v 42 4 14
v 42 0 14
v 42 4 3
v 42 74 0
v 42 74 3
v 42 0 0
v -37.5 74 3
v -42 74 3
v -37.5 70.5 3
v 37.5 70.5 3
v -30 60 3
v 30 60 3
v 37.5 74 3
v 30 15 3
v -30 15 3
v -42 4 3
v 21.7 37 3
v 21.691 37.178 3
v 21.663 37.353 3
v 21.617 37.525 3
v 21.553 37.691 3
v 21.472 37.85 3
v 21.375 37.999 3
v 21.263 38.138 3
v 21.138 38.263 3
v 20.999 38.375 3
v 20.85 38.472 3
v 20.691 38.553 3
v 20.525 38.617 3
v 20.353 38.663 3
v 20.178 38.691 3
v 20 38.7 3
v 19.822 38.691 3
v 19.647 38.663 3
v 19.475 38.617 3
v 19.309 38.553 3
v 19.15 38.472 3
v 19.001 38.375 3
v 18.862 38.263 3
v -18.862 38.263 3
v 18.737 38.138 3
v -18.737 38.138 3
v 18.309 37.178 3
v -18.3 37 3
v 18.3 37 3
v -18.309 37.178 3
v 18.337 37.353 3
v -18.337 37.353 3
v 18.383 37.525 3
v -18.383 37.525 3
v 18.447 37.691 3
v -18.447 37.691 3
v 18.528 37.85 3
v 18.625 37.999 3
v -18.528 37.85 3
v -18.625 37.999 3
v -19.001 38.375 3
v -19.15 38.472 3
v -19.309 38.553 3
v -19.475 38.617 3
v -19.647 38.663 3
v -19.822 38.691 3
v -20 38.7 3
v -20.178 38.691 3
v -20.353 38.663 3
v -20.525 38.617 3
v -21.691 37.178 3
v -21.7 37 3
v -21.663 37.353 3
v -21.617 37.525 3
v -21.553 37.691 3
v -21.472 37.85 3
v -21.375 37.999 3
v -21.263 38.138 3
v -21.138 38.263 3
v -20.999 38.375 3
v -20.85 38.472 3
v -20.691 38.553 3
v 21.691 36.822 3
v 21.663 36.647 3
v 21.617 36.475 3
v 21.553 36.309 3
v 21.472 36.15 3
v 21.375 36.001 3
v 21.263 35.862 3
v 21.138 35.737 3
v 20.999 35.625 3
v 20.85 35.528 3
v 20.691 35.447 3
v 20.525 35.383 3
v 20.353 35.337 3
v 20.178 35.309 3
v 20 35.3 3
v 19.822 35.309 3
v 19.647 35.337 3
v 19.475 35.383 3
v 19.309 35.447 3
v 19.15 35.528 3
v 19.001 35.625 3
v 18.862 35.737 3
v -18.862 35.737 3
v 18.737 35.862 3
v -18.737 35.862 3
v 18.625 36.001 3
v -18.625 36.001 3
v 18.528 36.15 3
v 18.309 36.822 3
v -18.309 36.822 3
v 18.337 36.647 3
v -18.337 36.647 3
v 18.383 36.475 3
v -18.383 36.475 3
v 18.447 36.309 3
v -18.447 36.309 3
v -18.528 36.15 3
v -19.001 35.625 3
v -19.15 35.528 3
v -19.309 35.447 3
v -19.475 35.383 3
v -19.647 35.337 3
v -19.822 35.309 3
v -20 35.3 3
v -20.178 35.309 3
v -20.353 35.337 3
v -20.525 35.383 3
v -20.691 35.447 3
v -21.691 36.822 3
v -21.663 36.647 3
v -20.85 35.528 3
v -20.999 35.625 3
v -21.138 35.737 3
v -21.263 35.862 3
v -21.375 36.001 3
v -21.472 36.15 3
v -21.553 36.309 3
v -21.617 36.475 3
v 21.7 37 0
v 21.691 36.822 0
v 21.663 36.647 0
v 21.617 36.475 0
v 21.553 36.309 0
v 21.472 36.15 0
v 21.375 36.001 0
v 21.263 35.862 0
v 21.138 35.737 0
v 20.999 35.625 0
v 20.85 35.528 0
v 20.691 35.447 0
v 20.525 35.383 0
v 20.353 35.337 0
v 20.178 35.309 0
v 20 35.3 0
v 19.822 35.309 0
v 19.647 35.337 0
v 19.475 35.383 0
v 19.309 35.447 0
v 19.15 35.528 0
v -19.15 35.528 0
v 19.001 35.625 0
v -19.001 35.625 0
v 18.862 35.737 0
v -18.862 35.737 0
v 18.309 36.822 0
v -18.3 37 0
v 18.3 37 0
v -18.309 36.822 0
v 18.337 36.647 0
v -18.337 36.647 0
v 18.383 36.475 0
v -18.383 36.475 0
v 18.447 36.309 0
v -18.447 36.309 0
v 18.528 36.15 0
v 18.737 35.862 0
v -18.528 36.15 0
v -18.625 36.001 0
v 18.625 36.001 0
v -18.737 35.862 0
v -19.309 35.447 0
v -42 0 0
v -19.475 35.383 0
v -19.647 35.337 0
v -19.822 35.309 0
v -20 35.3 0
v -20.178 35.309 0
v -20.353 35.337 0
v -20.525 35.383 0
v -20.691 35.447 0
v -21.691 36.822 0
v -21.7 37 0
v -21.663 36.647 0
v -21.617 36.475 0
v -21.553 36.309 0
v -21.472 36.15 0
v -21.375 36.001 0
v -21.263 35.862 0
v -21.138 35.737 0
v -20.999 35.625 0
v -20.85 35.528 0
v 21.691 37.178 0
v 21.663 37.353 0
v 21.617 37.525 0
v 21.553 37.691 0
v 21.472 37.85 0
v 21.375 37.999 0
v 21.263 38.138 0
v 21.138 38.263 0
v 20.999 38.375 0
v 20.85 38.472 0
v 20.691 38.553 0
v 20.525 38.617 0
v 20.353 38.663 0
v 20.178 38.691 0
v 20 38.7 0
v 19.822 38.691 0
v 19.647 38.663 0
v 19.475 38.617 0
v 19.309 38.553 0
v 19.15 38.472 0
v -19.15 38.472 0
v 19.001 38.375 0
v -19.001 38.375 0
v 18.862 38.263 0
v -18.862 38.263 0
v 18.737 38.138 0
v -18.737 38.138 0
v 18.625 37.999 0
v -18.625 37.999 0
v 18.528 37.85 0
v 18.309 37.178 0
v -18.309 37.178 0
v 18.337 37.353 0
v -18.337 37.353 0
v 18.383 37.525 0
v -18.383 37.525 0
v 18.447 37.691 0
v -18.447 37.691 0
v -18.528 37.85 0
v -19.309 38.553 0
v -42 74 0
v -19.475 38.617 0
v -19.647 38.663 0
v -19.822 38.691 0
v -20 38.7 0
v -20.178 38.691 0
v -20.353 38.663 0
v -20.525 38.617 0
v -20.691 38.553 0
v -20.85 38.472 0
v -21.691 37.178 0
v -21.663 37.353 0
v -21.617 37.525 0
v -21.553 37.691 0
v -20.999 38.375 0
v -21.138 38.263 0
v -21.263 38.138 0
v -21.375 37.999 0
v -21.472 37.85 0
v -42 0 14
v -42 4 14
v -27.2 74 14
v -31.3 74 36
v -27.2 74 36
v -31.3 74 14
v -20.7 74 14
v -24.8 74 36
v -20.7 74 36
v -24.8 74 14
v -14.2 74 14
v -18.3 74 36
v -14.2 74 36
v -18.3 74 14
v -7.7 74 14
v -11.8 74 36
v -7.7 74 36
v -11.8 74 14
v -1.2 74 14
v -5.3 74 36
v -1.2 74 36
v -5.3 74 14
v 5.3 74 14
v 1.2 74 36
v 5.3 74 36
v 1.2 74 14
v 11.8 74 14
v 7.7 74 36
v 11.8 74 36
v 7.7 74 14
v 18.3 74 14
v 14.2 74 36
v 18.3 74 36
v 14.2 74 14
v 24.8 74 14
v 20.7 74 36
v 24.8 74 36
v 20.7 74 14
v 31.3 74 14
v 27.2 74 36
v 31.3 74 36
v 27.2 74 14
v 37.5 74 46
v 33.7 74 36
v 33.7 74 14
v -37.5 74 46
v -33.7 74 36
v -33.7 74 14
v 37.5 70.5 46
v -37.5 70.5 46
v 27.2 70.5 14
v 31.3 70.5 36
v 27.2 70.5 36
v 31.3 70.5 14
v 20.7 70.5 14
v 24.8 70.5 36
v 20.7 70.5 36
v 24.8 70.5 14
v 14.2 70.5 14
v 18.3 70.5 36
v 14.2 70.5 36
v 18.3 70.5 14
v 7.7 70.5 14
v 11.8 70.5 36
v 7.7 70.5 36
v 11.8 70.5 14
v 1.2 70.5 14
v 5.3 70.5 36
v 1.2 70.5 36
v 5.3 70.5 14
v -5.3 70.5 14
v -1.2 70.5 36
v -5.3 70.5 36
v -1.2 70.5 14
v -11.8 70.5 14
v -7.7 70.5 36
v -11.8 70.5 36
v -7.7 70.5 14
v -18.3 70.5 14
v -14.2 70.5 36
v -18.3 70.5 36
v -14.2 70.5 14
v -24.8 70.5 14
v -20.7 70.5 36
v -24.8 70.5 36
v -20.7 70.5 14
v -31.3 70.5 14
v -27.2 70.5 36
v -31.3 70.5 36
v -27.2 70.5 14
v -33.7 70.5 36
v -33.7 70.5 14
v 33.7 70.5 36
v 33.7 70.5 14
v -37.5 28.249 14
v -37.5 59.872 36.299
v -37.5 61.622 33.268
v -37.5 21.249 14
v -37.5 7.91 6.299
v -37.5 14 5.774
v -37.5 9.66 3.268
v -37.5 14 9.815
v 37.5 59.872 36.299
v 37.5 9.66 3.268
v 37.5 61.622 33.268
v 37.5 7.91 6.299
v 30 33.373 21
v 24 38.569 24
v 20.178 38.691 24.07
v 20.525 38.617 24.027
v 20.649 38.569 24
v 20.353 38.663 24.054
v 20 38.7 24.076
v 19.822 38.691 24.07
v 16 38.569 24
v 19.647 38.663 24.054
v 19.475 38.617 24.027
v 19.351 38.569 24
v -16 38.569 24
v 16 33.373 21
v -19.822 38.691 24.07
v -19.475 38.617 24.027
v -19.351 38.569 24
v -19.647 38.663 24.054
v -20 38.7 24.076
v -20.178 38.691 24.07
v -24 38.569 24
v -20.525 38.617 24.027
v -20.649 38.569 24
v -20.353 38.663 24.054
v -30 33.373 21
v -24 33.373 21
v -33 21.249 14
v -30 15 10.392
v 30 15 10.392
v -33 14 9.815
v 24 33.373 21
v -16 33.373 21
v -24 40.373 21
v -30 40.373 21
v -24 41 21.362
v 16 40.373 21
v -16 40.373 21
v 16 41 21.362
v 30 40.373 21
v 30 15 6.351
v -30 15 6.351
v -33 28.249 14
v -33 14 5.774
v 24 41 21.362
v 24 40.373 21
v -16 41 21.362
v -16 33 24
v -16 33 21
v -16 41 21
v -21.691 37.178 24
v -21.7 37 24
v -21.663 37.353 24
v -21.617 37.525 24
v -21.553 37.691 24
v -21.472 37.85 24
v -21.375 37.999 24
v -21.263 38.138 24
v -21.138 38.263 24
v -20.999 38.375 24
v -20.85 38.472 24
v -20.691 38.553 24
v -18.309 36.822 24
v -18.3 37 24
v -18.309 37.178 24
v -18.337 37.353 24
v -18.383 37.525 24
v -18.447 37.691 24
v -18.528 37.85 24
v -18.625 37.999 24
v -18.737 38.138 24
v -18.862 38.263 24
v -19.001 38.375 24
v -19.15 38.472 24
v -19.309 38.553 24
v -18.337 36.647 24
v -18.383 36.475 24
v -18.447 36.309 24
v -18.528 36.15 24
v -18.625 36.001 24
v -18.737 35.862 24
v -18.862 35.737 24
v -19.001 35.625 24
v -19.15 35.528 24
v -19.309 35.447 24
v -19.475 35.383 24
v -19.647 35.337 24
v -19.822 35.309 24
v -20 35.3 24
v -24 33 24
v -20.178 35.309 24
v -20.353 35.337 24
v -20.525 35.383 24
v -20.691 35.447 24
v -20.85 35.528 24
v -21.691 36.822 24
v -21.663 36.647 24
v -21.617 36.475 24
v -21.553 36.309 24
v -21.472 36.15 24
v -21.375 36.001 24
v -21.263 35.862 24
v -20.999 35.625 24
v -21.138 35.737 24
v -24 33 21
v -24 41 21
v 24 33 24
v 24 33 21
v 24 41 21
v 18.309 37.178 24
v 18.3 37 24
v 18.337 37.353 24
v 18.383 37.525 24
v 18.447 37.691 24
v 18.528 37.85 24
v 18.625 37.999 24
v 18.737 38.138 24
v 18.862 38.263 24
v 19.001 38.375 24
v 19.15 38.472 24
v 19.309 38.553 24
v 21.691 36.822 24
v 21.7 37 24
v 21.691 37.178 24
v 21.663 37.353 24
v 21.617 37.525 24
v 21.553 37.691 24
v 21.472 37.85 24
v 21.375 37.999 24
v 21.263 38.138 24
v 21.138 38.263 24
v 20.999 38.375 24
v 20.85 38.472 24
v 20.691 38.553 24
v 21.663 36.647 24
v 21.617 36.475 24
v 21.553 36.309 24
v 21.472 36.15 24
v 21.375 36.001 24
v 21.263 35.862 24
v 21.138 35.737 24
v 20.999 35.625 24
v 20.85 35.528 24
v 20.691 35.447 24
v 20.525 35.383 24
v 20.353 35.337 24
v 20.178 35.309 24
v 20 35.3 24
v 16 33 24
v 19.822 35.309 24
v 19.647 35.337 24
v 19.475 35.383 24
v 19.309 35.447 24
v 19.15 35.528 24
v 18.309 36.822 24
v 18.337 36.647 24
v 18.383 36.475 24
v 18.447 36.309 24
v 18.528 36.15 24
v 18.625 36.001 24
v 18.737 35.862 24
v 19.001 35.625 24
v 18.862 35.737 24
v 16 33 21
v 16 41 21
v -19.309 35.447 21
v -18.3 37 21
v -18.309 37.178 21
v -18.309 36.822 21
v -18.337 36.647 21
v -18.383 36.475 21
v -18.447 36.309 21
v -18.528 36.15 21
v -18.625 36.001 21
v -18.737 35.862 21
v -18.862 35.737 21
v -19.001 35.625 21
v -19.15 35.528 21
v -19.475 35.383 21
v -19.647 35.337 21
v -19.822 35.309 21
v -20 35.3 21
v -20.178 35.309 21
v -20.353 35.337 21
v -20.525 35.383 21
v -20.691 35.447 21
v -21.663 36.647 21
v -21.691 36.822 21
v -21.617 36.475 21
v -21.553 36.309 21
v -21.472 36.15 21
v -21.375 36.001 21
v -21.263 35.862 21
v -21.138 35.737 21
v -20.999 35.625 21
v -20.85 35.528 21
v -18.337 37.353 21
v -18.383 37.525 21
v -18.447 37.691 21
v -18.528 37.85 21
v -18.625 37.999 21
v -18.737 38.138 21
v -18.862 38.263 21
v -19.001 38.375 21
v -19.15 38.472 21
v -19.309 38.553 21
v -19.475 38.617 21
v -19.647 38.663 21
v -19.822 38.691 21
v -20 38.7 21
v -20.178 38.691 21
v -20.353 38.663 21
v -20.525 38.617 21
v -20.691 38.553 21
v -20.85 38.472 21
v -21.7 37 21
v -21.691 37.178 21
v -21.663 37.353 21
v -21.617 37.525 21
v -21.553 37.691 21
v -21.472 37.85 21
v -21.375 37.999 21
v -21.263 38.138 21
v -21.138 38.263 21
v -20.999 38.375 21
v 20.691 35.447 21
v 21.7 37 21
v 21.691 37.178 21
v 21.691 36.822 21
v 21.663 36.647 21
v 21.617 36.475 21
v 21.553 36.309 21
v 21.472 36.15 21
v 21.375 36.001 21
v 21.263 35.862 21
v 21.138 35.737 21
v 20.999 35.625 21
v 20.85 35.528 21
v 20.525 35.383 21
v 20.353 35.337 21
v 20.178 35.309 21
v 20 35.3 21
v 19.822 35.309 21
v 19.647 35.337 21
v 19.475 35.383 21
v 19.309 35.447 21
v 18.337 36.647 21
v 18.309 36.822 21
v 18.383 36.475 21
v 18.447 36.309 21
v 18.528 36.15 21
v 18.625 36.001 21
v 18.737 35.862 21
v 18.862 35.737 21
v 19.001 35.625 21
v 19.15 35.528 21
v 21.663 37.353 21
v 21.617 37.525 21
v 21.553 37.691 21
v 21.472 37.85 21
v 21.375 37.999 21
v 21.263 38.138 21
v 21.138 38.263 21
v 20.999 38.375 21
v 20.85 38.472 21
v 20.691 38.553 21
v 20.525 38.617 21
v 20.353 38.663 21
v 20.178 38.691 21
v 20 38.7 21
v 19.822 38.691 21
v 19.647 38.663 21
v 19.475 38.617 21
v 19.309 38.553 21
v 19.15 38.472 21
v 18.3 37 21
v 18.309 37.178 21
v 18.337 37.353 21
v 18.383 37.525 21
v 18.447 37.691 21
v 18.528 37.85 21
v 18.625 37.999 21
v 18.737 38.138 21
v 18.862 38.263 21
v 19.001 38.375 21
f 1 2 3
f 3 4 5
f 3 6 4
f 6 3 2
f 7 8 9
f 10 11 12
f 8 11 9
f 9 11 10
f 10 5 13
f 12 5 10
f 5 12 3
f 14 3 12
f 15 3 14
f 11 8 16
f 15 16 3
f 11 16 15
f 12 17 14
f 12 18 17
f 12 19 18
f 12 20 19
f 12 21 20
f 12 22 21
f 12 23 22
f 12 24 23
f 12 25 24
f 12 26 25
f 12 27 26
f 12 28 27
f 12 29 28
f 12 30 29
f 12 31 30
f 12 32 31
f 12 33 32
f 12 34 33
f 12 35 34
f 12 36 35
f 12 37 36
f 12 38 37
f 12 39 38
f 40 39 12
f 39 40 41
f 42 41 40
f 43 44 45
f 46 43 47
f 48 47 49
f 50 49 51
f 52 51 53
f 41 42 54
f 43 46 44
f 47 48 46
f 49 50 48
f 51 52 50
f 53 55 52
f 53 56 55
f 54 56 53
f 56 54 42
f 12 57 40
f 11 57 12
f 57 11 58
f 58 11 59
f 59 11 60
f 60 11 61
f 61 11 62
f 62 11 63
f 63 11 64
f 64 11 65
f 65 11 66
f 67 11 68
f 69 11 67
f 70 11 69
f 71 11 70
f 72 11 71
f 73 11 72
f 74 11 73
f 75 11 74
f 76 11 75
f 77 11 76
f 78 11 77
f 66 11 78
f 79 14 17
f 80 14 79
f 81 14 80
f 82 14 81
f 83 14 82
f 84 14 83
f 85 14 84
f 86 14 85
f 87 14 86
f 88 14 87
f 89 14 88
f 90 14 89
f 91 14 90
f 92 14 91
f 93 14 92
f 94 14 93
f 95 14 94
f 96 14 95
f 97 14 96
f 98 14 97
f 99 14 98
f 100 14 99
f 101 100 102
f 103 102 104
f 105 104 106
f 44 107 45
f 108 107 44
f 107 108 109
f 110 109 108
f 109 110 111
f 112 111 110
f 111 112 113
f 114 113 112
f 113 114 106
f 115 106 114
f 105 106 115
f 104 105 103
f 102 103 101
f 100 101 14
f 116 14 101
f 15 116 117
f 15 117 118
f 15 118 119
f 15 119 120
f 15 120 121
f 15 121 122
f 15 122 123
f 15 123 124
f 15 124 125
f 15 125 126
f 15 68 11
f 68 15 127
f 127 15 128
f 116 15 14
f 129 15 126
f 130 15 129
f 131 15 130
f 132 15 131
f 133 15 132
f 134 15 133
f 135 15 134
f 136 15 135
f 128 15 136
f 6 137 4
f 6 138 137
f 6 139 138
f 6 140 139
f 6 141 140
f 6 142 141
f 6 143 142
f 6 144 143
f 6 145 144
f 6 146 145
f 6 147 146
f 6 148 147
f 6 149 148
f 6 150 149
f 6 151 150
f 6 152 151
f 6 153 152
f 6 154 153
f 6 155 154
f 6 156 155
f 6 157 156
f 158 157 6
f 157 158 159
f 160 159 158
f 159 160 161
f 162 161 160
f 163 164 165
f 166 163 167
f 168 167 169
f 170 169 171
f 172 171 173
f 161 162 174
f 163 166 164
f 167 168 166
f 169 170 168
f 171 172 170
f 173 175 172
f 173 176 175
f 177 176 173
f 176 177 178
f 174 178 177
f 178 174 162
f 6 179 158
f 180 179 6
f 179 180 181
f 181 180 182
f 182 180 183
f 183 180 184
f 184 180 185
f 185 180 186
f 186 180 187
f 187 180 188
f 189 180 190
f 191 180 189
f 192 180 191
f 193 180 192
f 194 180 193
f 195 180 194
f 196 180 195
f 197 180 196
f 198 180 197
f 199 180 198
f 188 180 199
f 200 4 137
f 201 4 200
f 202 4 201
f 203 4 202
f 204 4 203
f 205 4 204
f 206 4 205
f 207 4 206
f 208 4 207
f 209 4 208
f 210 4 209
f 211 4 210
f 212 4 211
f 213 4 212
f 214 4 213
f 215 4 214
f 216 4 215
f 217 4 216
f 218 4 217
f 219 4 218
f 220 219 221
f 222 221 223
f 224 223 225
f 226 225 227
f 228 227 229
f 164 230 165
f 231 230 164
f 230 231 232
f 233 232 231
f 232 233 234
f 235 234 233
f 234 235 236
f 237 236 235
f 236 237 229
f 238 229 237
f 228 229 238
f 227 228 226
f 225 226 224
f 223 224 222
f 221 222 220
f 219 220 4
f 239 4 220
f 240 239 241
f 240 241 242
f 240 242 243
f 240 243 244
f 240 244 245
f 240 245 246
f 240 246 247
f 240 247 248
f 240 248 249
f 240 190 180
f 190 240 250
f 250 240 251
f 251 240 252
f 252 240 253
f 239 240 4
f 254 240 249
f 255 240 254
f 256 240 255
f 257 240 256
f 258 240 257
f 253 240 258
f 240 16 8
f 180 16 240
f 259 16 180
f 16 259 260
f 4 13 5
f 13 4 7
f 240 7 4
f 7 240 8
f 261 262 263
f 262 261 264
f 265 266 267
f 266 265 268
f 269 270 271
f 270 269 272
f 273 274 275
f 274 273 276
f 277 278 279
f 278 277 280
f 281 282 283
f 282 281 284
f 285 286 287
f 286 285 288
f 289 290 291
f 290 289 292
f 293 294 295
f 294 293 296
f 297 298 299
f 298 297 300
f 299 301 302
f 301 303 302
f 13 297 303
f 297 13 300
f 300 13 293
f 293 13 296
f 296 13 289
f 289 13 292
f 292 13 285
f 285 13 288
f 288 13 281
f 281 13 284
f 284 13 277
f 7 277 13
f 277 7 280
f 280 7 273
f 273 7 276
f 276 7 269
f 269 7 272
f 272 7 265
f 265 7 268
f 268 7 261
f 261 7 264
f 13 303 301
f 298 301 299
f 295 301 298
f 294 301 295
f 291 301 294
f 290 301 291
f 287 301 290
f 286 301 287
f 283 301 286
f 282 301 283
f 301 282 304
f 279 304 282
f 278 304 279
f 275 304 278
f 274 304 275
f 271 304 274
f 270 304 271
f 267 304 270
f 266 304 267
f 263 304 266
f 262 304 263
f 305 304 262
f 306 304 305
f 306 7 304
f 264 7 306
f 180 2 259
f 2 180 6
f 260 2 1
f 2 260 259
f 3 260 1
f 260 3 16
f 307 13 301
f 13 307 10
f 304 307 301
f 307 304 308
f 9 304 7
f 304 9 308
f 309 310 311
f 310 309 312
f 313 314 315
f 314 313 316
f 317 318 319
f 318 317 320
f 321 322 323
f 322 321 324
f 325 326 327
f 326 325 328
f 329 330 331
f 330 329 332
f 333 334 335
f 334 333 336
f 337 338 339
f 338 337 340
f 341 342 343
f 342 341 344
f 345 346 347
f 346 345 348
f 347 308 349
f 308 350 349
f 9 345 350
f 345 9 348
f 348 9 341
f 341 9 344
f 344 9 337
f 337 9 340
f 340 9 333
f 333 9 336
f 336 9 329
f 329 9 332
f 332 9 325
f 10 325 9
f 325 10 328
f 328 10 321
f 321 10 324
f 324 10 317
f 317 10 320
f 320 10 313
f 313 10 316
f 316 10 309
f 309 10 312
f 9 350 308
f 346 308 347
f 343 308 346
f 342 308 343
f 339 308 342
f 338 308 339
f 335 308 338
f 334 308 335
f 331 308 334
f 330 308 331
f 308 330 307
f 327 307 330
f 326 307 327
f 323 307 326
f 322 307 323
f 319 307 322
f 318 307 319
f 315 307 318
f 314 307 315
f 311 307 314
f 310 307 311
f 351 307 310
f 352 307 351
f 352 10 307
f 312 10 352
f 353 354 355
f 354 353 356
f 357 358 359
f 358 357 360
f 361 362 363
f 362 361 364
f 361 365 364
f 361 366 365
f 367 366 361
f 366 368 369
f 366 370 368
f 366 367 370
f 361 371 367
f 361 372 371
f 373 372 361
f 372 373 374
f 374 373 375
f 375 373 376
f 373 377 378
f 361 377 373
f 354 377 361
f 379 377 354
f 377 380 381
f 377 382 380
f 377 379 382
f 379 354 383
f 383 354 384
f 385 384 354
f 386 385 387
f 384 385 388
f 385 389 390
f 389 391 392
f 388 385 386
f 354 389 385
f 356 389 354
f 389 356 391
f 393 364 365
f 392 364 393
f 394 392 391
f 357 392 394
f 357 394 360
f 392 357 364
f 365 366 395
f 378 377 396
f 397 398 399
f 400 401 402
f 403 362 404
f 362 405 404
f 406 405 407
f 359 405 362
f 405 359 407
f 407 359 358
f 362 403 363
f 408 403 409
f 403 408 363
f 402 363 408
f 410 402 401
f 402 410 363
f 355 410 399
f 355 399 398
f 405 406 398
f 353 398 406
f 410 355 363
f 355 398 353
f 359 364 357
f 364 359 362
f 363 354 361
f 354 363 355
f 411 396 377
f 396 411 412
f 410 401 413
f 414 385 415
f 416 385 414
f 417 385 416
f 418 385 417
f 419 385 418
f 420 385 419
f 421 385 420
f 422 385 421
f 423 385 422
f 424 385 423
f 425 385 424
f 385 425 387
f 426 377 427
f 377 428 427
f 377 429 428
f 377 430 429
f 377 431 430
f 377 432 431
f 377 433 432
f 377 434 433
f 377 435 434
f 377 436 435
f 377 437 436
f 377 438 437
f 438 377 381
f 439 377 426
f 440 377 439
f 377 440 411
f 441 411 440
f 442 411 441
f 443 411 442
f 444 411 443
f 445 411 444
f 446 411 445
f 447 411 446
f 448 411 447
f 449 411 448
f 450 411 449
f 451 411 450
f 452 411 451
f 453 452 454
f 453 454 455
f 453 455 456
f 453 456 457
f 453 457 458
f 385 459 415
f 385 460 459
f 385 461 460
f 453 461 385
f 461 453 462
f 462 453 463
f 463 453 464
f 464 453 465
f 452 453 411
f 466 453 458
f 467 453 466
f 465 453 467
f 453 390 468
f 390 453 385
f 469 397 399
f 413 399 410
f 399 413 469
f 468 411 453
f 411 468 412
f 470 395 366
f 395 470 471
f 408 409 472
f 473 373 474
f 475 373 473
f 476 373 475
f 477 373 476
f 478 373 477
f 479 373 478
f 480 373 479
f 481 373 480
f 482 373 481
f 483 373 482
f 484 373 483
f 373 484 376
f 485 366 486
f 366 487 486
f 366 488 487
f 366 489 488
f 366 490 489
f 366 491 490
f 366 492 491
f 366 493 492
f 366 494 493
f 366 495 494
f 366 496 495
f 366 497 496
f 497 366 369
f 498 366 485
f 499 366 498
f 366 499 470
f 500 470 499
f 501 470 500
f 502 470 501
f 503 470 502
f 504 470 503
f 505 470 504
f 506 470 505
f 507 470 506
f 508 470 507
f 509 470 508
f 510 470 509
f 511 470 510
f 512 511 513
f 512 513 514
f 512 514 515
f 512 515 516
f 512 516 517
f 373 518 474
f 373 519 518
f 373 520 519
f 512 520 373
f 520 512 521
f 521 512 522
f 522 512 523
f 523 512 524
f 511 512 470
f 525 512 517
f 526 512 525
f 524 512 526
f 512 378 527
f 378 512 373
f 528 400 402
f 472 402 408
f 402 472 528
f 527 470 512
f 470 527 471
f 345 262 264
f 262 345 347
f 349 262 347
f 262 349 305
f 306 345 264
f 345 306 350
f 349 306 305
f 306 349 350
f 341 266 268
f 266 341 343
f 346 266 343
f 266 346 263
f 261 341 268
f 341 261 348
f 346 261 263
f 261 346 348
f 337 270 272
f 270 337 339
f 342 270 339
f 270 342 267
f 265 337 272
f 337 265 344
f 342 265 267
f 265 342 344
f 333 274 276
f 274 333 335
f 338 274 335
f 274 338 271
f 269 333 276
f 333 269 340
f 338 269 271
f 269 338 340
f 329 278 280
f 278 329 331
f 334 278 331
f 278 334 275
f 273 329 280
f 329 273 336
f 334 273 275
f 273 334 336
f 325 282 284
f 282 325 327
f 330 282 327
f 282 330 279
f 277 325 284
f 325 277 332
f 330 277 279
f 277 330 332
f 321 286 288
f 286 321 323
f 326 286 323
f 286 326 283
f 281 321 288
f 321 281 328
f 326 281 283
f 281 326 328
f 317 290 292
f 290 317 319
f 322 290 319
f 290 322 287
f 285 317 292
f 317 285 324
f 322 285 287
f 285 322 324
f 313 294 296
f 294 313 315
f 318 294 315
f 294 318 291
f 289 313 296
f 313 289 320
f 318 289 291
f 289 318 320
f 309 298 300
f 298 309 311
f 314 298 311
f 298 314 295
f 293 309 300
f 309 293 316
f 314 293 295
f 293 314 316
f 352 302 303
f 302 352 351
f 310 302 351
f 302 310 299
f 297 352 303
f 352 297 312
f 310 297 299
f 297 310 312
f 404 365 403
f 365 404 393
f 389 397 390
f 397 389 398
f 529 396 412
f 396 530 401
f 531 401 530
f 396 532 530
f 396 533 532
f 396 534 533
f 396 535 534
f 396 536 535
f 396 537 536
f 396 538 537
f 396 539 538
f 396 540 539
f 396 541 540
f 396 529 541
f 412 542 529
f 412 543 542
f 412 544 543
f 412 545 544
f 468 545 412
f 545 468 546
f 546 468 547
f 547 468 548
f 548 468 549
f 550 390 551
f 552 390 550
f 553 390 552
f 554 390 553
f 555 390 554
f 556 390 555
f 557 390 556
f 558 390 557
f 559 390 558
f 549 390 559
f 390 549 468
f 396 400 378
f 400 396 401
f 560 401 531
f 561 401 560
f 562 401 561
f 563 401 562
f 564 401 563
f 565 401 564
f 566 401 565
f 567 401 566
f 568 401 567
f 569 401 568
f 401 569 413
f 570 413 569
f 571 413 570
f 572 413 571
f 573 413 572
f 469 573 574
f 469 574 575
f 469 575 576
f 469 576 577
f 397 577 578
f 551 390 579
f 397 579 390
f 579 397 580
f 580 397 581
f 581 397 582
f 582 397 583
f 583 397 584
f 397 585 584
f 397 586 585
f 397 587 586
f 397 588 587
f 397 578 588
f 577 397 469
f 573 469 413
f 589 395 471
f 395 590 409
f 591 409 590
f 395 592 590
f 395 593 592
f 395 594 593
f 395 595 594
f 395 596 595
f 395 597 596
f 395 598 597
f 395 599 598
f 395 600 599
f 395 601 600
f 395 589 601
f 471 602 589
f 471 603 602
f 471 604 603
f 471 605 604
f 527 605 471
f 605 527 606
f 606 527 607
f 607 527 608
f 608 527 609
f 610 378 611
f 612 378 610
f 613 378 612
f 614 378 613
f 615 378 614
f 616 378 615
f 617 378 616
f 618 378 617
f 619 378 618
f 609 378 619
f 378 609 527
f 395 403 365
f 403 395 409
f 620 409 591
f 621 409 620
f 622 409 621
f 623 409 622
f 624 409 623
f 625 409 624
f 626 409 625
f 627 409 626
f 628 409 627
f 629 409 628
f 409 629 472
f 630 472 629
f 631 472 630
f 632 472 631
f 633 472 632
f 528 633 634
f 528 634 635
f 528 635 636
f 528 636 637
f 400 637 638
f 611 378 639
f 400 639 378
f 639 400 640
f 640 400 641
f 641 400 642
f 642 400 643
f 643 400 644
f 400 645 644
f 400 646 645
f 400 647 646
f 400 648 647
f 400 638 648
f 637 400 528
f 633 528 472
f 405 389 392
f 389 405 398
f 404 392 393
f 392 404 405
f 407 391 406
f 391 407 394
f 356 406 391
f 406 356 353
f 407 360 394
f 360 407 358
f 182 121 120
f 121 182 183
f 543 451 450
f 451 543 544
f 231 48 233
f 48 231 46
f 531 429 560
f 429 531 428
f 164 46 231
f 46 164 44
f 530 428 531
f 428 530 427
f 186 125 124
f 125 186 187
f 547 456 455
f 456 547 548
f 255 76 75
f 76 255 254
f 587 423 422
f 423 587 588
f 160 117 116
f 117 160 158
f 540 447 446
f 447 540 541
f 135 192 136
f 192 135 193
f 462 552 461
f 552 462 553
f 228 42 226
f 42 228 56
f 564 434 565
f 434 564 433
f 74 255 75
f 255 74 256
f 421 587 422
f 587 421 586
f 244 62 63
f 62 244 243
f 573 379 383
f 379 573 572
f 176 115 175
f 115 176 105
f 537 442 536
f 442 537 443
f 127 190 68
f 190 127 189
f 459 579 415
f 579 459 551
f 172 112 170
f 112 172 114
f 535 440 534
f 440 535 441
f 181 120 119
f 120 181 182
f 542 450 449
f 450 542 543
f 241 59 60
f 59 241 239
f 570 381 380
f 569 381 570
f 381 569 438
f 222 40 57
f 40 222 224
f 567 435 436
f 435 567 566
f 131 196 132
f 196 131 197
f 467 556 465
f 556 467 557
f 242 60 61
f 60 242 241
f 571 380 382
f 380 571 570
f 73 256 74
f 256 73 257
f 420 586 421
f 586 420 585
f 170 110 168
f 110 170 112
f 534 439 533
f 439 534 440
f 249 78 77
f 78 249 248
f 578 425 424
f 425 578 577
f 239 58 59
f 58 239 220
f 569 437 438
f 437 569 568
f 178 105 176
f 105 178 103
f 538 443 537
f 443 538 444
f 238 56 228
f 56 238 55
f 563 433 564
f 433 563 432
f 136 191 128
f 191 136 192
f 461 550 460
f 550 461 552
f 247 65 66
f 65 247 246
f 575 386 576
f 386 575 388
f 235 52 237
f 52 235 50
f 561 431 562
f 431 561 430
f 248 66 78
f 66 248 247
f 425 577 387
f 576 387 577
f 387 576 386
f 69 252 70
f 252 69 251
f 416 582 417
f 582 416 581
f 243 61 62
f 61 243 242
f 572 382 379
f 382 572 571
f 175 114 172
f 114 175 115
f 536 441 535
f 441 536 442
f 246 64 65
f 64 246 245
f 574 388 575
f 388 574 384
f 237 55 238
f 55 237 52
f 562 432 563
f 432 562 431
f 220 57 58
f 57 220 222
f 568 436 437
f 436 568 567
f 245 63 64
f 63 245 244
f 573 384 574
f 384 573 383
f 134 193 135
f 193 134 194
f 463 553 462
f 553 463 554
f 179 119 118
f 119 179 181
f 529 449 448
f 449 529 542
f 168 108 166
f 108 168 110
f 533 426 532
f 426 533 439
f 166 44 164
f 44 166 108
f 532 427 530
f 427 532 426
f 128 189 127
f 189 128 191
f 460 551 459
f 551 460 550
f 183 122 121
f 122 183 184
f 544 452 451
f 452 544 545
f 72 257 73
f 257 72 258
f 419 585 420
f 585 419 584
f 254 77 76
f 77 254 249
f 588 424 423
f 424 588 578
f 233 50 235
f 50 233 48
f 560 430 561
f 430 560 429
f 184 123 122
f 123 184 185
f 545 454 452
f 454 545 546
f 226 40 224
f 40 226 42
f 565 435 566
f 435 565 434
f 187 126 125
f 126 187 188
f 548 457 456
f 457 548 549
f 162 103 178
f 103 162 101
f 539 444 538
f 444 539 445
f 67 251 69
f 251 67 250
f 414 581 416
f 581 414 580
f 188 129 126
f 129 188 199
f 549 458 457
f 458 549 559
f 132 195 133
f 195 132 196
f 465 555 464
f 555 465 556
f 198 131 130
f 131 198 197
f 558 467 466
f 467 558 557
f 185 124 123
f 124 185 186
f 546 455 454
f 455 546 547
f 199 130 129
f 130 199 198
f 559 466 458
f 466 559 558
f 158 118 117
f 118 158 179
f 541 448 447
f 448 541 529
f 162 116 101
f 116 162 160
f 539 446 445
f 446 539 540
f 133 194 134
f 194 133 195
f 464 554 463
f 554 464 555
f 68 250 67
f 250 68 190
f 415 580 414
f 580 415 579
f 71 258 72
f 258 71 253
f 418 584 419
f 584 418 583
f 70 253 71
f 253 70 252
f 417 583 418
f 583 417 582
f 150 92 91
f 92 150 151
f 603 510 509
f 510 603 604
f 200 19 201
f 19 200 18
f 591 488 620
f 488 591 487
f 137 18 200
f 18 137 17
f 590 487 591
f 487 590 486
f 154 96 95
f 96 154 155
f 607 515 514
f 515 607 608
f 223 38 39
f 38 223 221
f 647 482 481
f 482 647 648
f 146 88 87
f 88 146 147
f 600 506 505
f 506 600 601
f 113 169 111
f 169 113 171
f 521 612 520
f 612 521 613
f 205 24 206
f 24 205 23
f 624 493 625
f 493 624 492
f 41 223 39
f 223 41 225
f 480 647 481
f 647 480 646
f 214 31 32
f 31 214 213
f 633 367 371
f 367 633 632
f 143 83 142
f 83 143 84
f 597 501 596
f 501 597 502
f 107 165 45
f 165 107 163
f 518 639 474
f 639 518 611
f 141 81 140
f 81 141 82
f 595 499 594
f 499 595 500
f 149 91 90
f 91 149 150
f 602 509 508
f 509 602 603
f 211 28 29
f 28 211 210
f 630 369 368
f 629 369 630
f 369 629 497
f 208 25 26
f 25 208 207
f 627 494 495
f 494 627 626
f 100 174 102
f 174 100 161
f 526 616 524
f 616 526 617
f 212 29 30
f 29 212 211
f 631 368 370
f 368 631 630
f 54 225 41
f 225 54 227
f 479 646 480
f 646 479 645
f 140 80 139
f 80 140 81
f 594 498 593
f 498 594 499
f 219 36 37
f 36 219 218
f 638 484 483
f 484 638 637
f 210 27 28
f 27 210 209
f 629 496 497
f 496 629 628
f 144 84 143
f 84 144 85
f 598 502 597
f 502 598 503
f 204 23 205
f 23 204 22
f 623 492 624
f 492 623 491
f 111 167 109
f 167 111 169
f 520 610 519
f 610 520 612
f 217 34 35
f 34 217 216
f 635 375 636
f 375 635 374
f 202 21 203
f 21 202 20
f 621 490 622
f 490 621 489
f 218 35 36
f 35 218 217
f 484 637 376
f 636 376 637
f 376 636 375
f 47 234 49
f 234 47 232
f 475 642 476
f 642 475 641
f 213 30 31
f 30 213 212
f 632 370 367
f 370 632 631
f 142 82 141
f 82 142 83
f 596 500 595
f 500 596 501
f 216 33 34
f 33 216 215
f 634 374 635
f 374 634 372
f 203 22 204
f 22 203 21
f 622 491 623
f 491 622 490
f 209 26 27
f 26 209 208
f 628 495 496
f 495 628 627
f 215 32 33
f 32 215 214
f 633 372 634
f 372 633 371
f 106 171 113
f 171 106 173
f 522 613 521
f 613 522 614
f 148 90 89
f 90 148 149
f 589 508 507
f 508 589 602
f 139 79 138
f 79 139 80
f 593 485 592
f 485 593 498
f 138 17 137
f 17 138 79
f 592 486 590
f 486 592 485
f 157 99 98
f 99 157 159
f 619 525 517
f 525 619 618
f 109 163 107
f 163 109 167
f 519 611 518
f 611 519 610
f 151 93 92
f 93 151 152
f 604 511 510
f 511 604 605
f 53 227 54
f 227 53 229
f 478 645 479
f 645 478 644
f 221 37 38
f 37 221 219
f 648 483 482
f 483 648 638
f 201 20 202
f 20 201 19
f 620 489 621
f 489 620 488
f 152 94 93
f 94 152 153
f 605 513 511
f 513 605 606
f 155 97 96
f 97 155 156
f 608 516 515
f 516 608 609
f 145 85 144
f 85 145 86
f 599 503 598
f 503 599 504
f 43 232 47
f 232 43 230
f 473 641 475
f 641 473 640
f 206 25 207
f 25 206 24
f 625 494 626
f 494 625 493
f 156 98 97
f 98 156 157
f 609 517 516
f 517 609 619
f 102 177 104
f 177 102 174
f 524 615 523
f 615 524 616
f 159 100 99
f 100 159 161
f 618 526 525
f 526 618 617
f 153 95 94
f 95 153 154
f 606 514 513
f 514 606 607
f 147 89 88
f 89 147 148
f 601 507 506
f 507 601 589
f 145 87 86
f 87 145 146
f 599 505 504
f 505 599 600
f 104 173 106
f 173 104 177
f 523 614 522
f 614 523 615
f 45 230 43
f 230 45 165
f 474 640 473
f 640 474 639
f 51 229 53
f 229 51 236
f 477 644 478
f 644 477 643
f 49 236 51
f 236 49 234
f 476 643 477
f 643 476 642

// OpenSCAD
// ==============================================================================
// Wio Terminal 桌面多功能仰角底座与音腔背壳 (Desktop Angled Dock & Sound Chamber)
// 专为“小维”AI 电子桌宠、赛博时钟、番茄钟设计
// 支持标准 30° 黄金视距仰角，内嵌 I2S 腔体喇叭 + 聚合物锂电池
// ==============================================================================

$fn = 60;

// 设备外形尺寸 (Wio Terminal: 72mm x 57mm x 12mm)
wio_width   = 72.0;
wio_height  = 57.0;
wio_depth   = 12.0;
clearance   = 0.6; // 装配公差

// 底座外壳参数
dock_width  = 84.0;
dock_depth  = 74.0;
front_h     = 10.0;
back_h      = 46.0;
tilt_angle  = 30.0; // 30度黄金倾角
wall_thick  = 3.2;

module wio_desktop_dock() {
    difference() {
        // 主基座外壳轮廓
        union() {
            // 底座平稳承重底板
            translate([-dock_width/2, 0, 0])
                cube([dock_width, dock_depth, 3.0]);

            // 左右加厚侧向三角支撑臂
            translate([-dock_width/2, 0, 0])
                polyhedron(
                    points = [
                        [0, 0, 0], [4.5, 0, 0], [4.5, dock_depth, 0], [0, dock_depth, 0],
                        [0, 0, front_h], [4.5, 0, front_h], [4.5, dock_depth, back_h], [0, dock_depth, back_h]
                    ],
                    faces = [
                        [0,1,2,3], [4,5,6,7], [0,1,5,4], [2,3,7,6], [0,3,7,4], [1,2,6,5]
                    ]
                );

            translate([dock_width/2 - 4.5, 0, 0])
                polyhedron(
                    points = [
                        [0, 0, 0], [4.5, 0, 0], [4.5, dock_depth, 0], [0, dock_depth, 0],
                        [0, 0, front_h], [4.5, 0, front_h], [4.5, dock_depth, back_h], [0, dock_depth, back_h]
                    ],
                    faces = [
                        [0,1,2,3], [4,5,6,7], [0,1,5,4], [2,3,7,6], [0,3,7,4], [1,2,6,5]
                    ]
                );

            // 前方防滑托台
            translate([-dock_width/2, 0, 0])
                cube([dock_width, 4.0, 14.0]);

            // 背部支撑背板
            translate([-dock_width/2 + 4.5, dock_depth - 3.5, 0])
                cube([dock_width - 9.0, 3.5, back_h]);

            // 倾斜背衬板
            rotate([tilt_angle, 0, 0])
                translate([-dock_width/2 + 4.5, 10.0, -2.0])
                    cube([dock_width - 9.0, 60.0, 3.5]);

            // M3 螺丝固定座 (间距 40mm)
            translate([-20 - 4, dock_depth/2 - 4, 12])
                cube([8, 8, 12]);
            translate([ 20 - 4, dock_depth/2 - 4, 12])
                cube([8, 8, 12]);
        }

        // 内部音腔与电池预留空腔 (60mm x 45mm x 16mm)
        translate([-30, 15, 3.0])
            cube([60, 45, 18]);

        // 背部百叶窗式出音孔
        for (i = [-5 : 5]) {
            translate([i * 6.5 - 1.2, dock_depth - 5.0, 14.0])
                cube([2.4, 8.0, 22.0]);
        }

        // 左侧 Type-C 充电开孔与电源开关开孔
        translate([-dock_width/2 - 1, 14.0, 4.0])
            cube([10.0, 18.0, 10.0]);

        // M3 螺丝过孔
        translate([-20, dock_depth/2, 0])
            cylinder(d = 3.4, h = 30);
        translate([ 20, dock_depth/2, 0])
            cylinder(d = 3.4, h = 30);
    }
}

wio_desktop_dock();
